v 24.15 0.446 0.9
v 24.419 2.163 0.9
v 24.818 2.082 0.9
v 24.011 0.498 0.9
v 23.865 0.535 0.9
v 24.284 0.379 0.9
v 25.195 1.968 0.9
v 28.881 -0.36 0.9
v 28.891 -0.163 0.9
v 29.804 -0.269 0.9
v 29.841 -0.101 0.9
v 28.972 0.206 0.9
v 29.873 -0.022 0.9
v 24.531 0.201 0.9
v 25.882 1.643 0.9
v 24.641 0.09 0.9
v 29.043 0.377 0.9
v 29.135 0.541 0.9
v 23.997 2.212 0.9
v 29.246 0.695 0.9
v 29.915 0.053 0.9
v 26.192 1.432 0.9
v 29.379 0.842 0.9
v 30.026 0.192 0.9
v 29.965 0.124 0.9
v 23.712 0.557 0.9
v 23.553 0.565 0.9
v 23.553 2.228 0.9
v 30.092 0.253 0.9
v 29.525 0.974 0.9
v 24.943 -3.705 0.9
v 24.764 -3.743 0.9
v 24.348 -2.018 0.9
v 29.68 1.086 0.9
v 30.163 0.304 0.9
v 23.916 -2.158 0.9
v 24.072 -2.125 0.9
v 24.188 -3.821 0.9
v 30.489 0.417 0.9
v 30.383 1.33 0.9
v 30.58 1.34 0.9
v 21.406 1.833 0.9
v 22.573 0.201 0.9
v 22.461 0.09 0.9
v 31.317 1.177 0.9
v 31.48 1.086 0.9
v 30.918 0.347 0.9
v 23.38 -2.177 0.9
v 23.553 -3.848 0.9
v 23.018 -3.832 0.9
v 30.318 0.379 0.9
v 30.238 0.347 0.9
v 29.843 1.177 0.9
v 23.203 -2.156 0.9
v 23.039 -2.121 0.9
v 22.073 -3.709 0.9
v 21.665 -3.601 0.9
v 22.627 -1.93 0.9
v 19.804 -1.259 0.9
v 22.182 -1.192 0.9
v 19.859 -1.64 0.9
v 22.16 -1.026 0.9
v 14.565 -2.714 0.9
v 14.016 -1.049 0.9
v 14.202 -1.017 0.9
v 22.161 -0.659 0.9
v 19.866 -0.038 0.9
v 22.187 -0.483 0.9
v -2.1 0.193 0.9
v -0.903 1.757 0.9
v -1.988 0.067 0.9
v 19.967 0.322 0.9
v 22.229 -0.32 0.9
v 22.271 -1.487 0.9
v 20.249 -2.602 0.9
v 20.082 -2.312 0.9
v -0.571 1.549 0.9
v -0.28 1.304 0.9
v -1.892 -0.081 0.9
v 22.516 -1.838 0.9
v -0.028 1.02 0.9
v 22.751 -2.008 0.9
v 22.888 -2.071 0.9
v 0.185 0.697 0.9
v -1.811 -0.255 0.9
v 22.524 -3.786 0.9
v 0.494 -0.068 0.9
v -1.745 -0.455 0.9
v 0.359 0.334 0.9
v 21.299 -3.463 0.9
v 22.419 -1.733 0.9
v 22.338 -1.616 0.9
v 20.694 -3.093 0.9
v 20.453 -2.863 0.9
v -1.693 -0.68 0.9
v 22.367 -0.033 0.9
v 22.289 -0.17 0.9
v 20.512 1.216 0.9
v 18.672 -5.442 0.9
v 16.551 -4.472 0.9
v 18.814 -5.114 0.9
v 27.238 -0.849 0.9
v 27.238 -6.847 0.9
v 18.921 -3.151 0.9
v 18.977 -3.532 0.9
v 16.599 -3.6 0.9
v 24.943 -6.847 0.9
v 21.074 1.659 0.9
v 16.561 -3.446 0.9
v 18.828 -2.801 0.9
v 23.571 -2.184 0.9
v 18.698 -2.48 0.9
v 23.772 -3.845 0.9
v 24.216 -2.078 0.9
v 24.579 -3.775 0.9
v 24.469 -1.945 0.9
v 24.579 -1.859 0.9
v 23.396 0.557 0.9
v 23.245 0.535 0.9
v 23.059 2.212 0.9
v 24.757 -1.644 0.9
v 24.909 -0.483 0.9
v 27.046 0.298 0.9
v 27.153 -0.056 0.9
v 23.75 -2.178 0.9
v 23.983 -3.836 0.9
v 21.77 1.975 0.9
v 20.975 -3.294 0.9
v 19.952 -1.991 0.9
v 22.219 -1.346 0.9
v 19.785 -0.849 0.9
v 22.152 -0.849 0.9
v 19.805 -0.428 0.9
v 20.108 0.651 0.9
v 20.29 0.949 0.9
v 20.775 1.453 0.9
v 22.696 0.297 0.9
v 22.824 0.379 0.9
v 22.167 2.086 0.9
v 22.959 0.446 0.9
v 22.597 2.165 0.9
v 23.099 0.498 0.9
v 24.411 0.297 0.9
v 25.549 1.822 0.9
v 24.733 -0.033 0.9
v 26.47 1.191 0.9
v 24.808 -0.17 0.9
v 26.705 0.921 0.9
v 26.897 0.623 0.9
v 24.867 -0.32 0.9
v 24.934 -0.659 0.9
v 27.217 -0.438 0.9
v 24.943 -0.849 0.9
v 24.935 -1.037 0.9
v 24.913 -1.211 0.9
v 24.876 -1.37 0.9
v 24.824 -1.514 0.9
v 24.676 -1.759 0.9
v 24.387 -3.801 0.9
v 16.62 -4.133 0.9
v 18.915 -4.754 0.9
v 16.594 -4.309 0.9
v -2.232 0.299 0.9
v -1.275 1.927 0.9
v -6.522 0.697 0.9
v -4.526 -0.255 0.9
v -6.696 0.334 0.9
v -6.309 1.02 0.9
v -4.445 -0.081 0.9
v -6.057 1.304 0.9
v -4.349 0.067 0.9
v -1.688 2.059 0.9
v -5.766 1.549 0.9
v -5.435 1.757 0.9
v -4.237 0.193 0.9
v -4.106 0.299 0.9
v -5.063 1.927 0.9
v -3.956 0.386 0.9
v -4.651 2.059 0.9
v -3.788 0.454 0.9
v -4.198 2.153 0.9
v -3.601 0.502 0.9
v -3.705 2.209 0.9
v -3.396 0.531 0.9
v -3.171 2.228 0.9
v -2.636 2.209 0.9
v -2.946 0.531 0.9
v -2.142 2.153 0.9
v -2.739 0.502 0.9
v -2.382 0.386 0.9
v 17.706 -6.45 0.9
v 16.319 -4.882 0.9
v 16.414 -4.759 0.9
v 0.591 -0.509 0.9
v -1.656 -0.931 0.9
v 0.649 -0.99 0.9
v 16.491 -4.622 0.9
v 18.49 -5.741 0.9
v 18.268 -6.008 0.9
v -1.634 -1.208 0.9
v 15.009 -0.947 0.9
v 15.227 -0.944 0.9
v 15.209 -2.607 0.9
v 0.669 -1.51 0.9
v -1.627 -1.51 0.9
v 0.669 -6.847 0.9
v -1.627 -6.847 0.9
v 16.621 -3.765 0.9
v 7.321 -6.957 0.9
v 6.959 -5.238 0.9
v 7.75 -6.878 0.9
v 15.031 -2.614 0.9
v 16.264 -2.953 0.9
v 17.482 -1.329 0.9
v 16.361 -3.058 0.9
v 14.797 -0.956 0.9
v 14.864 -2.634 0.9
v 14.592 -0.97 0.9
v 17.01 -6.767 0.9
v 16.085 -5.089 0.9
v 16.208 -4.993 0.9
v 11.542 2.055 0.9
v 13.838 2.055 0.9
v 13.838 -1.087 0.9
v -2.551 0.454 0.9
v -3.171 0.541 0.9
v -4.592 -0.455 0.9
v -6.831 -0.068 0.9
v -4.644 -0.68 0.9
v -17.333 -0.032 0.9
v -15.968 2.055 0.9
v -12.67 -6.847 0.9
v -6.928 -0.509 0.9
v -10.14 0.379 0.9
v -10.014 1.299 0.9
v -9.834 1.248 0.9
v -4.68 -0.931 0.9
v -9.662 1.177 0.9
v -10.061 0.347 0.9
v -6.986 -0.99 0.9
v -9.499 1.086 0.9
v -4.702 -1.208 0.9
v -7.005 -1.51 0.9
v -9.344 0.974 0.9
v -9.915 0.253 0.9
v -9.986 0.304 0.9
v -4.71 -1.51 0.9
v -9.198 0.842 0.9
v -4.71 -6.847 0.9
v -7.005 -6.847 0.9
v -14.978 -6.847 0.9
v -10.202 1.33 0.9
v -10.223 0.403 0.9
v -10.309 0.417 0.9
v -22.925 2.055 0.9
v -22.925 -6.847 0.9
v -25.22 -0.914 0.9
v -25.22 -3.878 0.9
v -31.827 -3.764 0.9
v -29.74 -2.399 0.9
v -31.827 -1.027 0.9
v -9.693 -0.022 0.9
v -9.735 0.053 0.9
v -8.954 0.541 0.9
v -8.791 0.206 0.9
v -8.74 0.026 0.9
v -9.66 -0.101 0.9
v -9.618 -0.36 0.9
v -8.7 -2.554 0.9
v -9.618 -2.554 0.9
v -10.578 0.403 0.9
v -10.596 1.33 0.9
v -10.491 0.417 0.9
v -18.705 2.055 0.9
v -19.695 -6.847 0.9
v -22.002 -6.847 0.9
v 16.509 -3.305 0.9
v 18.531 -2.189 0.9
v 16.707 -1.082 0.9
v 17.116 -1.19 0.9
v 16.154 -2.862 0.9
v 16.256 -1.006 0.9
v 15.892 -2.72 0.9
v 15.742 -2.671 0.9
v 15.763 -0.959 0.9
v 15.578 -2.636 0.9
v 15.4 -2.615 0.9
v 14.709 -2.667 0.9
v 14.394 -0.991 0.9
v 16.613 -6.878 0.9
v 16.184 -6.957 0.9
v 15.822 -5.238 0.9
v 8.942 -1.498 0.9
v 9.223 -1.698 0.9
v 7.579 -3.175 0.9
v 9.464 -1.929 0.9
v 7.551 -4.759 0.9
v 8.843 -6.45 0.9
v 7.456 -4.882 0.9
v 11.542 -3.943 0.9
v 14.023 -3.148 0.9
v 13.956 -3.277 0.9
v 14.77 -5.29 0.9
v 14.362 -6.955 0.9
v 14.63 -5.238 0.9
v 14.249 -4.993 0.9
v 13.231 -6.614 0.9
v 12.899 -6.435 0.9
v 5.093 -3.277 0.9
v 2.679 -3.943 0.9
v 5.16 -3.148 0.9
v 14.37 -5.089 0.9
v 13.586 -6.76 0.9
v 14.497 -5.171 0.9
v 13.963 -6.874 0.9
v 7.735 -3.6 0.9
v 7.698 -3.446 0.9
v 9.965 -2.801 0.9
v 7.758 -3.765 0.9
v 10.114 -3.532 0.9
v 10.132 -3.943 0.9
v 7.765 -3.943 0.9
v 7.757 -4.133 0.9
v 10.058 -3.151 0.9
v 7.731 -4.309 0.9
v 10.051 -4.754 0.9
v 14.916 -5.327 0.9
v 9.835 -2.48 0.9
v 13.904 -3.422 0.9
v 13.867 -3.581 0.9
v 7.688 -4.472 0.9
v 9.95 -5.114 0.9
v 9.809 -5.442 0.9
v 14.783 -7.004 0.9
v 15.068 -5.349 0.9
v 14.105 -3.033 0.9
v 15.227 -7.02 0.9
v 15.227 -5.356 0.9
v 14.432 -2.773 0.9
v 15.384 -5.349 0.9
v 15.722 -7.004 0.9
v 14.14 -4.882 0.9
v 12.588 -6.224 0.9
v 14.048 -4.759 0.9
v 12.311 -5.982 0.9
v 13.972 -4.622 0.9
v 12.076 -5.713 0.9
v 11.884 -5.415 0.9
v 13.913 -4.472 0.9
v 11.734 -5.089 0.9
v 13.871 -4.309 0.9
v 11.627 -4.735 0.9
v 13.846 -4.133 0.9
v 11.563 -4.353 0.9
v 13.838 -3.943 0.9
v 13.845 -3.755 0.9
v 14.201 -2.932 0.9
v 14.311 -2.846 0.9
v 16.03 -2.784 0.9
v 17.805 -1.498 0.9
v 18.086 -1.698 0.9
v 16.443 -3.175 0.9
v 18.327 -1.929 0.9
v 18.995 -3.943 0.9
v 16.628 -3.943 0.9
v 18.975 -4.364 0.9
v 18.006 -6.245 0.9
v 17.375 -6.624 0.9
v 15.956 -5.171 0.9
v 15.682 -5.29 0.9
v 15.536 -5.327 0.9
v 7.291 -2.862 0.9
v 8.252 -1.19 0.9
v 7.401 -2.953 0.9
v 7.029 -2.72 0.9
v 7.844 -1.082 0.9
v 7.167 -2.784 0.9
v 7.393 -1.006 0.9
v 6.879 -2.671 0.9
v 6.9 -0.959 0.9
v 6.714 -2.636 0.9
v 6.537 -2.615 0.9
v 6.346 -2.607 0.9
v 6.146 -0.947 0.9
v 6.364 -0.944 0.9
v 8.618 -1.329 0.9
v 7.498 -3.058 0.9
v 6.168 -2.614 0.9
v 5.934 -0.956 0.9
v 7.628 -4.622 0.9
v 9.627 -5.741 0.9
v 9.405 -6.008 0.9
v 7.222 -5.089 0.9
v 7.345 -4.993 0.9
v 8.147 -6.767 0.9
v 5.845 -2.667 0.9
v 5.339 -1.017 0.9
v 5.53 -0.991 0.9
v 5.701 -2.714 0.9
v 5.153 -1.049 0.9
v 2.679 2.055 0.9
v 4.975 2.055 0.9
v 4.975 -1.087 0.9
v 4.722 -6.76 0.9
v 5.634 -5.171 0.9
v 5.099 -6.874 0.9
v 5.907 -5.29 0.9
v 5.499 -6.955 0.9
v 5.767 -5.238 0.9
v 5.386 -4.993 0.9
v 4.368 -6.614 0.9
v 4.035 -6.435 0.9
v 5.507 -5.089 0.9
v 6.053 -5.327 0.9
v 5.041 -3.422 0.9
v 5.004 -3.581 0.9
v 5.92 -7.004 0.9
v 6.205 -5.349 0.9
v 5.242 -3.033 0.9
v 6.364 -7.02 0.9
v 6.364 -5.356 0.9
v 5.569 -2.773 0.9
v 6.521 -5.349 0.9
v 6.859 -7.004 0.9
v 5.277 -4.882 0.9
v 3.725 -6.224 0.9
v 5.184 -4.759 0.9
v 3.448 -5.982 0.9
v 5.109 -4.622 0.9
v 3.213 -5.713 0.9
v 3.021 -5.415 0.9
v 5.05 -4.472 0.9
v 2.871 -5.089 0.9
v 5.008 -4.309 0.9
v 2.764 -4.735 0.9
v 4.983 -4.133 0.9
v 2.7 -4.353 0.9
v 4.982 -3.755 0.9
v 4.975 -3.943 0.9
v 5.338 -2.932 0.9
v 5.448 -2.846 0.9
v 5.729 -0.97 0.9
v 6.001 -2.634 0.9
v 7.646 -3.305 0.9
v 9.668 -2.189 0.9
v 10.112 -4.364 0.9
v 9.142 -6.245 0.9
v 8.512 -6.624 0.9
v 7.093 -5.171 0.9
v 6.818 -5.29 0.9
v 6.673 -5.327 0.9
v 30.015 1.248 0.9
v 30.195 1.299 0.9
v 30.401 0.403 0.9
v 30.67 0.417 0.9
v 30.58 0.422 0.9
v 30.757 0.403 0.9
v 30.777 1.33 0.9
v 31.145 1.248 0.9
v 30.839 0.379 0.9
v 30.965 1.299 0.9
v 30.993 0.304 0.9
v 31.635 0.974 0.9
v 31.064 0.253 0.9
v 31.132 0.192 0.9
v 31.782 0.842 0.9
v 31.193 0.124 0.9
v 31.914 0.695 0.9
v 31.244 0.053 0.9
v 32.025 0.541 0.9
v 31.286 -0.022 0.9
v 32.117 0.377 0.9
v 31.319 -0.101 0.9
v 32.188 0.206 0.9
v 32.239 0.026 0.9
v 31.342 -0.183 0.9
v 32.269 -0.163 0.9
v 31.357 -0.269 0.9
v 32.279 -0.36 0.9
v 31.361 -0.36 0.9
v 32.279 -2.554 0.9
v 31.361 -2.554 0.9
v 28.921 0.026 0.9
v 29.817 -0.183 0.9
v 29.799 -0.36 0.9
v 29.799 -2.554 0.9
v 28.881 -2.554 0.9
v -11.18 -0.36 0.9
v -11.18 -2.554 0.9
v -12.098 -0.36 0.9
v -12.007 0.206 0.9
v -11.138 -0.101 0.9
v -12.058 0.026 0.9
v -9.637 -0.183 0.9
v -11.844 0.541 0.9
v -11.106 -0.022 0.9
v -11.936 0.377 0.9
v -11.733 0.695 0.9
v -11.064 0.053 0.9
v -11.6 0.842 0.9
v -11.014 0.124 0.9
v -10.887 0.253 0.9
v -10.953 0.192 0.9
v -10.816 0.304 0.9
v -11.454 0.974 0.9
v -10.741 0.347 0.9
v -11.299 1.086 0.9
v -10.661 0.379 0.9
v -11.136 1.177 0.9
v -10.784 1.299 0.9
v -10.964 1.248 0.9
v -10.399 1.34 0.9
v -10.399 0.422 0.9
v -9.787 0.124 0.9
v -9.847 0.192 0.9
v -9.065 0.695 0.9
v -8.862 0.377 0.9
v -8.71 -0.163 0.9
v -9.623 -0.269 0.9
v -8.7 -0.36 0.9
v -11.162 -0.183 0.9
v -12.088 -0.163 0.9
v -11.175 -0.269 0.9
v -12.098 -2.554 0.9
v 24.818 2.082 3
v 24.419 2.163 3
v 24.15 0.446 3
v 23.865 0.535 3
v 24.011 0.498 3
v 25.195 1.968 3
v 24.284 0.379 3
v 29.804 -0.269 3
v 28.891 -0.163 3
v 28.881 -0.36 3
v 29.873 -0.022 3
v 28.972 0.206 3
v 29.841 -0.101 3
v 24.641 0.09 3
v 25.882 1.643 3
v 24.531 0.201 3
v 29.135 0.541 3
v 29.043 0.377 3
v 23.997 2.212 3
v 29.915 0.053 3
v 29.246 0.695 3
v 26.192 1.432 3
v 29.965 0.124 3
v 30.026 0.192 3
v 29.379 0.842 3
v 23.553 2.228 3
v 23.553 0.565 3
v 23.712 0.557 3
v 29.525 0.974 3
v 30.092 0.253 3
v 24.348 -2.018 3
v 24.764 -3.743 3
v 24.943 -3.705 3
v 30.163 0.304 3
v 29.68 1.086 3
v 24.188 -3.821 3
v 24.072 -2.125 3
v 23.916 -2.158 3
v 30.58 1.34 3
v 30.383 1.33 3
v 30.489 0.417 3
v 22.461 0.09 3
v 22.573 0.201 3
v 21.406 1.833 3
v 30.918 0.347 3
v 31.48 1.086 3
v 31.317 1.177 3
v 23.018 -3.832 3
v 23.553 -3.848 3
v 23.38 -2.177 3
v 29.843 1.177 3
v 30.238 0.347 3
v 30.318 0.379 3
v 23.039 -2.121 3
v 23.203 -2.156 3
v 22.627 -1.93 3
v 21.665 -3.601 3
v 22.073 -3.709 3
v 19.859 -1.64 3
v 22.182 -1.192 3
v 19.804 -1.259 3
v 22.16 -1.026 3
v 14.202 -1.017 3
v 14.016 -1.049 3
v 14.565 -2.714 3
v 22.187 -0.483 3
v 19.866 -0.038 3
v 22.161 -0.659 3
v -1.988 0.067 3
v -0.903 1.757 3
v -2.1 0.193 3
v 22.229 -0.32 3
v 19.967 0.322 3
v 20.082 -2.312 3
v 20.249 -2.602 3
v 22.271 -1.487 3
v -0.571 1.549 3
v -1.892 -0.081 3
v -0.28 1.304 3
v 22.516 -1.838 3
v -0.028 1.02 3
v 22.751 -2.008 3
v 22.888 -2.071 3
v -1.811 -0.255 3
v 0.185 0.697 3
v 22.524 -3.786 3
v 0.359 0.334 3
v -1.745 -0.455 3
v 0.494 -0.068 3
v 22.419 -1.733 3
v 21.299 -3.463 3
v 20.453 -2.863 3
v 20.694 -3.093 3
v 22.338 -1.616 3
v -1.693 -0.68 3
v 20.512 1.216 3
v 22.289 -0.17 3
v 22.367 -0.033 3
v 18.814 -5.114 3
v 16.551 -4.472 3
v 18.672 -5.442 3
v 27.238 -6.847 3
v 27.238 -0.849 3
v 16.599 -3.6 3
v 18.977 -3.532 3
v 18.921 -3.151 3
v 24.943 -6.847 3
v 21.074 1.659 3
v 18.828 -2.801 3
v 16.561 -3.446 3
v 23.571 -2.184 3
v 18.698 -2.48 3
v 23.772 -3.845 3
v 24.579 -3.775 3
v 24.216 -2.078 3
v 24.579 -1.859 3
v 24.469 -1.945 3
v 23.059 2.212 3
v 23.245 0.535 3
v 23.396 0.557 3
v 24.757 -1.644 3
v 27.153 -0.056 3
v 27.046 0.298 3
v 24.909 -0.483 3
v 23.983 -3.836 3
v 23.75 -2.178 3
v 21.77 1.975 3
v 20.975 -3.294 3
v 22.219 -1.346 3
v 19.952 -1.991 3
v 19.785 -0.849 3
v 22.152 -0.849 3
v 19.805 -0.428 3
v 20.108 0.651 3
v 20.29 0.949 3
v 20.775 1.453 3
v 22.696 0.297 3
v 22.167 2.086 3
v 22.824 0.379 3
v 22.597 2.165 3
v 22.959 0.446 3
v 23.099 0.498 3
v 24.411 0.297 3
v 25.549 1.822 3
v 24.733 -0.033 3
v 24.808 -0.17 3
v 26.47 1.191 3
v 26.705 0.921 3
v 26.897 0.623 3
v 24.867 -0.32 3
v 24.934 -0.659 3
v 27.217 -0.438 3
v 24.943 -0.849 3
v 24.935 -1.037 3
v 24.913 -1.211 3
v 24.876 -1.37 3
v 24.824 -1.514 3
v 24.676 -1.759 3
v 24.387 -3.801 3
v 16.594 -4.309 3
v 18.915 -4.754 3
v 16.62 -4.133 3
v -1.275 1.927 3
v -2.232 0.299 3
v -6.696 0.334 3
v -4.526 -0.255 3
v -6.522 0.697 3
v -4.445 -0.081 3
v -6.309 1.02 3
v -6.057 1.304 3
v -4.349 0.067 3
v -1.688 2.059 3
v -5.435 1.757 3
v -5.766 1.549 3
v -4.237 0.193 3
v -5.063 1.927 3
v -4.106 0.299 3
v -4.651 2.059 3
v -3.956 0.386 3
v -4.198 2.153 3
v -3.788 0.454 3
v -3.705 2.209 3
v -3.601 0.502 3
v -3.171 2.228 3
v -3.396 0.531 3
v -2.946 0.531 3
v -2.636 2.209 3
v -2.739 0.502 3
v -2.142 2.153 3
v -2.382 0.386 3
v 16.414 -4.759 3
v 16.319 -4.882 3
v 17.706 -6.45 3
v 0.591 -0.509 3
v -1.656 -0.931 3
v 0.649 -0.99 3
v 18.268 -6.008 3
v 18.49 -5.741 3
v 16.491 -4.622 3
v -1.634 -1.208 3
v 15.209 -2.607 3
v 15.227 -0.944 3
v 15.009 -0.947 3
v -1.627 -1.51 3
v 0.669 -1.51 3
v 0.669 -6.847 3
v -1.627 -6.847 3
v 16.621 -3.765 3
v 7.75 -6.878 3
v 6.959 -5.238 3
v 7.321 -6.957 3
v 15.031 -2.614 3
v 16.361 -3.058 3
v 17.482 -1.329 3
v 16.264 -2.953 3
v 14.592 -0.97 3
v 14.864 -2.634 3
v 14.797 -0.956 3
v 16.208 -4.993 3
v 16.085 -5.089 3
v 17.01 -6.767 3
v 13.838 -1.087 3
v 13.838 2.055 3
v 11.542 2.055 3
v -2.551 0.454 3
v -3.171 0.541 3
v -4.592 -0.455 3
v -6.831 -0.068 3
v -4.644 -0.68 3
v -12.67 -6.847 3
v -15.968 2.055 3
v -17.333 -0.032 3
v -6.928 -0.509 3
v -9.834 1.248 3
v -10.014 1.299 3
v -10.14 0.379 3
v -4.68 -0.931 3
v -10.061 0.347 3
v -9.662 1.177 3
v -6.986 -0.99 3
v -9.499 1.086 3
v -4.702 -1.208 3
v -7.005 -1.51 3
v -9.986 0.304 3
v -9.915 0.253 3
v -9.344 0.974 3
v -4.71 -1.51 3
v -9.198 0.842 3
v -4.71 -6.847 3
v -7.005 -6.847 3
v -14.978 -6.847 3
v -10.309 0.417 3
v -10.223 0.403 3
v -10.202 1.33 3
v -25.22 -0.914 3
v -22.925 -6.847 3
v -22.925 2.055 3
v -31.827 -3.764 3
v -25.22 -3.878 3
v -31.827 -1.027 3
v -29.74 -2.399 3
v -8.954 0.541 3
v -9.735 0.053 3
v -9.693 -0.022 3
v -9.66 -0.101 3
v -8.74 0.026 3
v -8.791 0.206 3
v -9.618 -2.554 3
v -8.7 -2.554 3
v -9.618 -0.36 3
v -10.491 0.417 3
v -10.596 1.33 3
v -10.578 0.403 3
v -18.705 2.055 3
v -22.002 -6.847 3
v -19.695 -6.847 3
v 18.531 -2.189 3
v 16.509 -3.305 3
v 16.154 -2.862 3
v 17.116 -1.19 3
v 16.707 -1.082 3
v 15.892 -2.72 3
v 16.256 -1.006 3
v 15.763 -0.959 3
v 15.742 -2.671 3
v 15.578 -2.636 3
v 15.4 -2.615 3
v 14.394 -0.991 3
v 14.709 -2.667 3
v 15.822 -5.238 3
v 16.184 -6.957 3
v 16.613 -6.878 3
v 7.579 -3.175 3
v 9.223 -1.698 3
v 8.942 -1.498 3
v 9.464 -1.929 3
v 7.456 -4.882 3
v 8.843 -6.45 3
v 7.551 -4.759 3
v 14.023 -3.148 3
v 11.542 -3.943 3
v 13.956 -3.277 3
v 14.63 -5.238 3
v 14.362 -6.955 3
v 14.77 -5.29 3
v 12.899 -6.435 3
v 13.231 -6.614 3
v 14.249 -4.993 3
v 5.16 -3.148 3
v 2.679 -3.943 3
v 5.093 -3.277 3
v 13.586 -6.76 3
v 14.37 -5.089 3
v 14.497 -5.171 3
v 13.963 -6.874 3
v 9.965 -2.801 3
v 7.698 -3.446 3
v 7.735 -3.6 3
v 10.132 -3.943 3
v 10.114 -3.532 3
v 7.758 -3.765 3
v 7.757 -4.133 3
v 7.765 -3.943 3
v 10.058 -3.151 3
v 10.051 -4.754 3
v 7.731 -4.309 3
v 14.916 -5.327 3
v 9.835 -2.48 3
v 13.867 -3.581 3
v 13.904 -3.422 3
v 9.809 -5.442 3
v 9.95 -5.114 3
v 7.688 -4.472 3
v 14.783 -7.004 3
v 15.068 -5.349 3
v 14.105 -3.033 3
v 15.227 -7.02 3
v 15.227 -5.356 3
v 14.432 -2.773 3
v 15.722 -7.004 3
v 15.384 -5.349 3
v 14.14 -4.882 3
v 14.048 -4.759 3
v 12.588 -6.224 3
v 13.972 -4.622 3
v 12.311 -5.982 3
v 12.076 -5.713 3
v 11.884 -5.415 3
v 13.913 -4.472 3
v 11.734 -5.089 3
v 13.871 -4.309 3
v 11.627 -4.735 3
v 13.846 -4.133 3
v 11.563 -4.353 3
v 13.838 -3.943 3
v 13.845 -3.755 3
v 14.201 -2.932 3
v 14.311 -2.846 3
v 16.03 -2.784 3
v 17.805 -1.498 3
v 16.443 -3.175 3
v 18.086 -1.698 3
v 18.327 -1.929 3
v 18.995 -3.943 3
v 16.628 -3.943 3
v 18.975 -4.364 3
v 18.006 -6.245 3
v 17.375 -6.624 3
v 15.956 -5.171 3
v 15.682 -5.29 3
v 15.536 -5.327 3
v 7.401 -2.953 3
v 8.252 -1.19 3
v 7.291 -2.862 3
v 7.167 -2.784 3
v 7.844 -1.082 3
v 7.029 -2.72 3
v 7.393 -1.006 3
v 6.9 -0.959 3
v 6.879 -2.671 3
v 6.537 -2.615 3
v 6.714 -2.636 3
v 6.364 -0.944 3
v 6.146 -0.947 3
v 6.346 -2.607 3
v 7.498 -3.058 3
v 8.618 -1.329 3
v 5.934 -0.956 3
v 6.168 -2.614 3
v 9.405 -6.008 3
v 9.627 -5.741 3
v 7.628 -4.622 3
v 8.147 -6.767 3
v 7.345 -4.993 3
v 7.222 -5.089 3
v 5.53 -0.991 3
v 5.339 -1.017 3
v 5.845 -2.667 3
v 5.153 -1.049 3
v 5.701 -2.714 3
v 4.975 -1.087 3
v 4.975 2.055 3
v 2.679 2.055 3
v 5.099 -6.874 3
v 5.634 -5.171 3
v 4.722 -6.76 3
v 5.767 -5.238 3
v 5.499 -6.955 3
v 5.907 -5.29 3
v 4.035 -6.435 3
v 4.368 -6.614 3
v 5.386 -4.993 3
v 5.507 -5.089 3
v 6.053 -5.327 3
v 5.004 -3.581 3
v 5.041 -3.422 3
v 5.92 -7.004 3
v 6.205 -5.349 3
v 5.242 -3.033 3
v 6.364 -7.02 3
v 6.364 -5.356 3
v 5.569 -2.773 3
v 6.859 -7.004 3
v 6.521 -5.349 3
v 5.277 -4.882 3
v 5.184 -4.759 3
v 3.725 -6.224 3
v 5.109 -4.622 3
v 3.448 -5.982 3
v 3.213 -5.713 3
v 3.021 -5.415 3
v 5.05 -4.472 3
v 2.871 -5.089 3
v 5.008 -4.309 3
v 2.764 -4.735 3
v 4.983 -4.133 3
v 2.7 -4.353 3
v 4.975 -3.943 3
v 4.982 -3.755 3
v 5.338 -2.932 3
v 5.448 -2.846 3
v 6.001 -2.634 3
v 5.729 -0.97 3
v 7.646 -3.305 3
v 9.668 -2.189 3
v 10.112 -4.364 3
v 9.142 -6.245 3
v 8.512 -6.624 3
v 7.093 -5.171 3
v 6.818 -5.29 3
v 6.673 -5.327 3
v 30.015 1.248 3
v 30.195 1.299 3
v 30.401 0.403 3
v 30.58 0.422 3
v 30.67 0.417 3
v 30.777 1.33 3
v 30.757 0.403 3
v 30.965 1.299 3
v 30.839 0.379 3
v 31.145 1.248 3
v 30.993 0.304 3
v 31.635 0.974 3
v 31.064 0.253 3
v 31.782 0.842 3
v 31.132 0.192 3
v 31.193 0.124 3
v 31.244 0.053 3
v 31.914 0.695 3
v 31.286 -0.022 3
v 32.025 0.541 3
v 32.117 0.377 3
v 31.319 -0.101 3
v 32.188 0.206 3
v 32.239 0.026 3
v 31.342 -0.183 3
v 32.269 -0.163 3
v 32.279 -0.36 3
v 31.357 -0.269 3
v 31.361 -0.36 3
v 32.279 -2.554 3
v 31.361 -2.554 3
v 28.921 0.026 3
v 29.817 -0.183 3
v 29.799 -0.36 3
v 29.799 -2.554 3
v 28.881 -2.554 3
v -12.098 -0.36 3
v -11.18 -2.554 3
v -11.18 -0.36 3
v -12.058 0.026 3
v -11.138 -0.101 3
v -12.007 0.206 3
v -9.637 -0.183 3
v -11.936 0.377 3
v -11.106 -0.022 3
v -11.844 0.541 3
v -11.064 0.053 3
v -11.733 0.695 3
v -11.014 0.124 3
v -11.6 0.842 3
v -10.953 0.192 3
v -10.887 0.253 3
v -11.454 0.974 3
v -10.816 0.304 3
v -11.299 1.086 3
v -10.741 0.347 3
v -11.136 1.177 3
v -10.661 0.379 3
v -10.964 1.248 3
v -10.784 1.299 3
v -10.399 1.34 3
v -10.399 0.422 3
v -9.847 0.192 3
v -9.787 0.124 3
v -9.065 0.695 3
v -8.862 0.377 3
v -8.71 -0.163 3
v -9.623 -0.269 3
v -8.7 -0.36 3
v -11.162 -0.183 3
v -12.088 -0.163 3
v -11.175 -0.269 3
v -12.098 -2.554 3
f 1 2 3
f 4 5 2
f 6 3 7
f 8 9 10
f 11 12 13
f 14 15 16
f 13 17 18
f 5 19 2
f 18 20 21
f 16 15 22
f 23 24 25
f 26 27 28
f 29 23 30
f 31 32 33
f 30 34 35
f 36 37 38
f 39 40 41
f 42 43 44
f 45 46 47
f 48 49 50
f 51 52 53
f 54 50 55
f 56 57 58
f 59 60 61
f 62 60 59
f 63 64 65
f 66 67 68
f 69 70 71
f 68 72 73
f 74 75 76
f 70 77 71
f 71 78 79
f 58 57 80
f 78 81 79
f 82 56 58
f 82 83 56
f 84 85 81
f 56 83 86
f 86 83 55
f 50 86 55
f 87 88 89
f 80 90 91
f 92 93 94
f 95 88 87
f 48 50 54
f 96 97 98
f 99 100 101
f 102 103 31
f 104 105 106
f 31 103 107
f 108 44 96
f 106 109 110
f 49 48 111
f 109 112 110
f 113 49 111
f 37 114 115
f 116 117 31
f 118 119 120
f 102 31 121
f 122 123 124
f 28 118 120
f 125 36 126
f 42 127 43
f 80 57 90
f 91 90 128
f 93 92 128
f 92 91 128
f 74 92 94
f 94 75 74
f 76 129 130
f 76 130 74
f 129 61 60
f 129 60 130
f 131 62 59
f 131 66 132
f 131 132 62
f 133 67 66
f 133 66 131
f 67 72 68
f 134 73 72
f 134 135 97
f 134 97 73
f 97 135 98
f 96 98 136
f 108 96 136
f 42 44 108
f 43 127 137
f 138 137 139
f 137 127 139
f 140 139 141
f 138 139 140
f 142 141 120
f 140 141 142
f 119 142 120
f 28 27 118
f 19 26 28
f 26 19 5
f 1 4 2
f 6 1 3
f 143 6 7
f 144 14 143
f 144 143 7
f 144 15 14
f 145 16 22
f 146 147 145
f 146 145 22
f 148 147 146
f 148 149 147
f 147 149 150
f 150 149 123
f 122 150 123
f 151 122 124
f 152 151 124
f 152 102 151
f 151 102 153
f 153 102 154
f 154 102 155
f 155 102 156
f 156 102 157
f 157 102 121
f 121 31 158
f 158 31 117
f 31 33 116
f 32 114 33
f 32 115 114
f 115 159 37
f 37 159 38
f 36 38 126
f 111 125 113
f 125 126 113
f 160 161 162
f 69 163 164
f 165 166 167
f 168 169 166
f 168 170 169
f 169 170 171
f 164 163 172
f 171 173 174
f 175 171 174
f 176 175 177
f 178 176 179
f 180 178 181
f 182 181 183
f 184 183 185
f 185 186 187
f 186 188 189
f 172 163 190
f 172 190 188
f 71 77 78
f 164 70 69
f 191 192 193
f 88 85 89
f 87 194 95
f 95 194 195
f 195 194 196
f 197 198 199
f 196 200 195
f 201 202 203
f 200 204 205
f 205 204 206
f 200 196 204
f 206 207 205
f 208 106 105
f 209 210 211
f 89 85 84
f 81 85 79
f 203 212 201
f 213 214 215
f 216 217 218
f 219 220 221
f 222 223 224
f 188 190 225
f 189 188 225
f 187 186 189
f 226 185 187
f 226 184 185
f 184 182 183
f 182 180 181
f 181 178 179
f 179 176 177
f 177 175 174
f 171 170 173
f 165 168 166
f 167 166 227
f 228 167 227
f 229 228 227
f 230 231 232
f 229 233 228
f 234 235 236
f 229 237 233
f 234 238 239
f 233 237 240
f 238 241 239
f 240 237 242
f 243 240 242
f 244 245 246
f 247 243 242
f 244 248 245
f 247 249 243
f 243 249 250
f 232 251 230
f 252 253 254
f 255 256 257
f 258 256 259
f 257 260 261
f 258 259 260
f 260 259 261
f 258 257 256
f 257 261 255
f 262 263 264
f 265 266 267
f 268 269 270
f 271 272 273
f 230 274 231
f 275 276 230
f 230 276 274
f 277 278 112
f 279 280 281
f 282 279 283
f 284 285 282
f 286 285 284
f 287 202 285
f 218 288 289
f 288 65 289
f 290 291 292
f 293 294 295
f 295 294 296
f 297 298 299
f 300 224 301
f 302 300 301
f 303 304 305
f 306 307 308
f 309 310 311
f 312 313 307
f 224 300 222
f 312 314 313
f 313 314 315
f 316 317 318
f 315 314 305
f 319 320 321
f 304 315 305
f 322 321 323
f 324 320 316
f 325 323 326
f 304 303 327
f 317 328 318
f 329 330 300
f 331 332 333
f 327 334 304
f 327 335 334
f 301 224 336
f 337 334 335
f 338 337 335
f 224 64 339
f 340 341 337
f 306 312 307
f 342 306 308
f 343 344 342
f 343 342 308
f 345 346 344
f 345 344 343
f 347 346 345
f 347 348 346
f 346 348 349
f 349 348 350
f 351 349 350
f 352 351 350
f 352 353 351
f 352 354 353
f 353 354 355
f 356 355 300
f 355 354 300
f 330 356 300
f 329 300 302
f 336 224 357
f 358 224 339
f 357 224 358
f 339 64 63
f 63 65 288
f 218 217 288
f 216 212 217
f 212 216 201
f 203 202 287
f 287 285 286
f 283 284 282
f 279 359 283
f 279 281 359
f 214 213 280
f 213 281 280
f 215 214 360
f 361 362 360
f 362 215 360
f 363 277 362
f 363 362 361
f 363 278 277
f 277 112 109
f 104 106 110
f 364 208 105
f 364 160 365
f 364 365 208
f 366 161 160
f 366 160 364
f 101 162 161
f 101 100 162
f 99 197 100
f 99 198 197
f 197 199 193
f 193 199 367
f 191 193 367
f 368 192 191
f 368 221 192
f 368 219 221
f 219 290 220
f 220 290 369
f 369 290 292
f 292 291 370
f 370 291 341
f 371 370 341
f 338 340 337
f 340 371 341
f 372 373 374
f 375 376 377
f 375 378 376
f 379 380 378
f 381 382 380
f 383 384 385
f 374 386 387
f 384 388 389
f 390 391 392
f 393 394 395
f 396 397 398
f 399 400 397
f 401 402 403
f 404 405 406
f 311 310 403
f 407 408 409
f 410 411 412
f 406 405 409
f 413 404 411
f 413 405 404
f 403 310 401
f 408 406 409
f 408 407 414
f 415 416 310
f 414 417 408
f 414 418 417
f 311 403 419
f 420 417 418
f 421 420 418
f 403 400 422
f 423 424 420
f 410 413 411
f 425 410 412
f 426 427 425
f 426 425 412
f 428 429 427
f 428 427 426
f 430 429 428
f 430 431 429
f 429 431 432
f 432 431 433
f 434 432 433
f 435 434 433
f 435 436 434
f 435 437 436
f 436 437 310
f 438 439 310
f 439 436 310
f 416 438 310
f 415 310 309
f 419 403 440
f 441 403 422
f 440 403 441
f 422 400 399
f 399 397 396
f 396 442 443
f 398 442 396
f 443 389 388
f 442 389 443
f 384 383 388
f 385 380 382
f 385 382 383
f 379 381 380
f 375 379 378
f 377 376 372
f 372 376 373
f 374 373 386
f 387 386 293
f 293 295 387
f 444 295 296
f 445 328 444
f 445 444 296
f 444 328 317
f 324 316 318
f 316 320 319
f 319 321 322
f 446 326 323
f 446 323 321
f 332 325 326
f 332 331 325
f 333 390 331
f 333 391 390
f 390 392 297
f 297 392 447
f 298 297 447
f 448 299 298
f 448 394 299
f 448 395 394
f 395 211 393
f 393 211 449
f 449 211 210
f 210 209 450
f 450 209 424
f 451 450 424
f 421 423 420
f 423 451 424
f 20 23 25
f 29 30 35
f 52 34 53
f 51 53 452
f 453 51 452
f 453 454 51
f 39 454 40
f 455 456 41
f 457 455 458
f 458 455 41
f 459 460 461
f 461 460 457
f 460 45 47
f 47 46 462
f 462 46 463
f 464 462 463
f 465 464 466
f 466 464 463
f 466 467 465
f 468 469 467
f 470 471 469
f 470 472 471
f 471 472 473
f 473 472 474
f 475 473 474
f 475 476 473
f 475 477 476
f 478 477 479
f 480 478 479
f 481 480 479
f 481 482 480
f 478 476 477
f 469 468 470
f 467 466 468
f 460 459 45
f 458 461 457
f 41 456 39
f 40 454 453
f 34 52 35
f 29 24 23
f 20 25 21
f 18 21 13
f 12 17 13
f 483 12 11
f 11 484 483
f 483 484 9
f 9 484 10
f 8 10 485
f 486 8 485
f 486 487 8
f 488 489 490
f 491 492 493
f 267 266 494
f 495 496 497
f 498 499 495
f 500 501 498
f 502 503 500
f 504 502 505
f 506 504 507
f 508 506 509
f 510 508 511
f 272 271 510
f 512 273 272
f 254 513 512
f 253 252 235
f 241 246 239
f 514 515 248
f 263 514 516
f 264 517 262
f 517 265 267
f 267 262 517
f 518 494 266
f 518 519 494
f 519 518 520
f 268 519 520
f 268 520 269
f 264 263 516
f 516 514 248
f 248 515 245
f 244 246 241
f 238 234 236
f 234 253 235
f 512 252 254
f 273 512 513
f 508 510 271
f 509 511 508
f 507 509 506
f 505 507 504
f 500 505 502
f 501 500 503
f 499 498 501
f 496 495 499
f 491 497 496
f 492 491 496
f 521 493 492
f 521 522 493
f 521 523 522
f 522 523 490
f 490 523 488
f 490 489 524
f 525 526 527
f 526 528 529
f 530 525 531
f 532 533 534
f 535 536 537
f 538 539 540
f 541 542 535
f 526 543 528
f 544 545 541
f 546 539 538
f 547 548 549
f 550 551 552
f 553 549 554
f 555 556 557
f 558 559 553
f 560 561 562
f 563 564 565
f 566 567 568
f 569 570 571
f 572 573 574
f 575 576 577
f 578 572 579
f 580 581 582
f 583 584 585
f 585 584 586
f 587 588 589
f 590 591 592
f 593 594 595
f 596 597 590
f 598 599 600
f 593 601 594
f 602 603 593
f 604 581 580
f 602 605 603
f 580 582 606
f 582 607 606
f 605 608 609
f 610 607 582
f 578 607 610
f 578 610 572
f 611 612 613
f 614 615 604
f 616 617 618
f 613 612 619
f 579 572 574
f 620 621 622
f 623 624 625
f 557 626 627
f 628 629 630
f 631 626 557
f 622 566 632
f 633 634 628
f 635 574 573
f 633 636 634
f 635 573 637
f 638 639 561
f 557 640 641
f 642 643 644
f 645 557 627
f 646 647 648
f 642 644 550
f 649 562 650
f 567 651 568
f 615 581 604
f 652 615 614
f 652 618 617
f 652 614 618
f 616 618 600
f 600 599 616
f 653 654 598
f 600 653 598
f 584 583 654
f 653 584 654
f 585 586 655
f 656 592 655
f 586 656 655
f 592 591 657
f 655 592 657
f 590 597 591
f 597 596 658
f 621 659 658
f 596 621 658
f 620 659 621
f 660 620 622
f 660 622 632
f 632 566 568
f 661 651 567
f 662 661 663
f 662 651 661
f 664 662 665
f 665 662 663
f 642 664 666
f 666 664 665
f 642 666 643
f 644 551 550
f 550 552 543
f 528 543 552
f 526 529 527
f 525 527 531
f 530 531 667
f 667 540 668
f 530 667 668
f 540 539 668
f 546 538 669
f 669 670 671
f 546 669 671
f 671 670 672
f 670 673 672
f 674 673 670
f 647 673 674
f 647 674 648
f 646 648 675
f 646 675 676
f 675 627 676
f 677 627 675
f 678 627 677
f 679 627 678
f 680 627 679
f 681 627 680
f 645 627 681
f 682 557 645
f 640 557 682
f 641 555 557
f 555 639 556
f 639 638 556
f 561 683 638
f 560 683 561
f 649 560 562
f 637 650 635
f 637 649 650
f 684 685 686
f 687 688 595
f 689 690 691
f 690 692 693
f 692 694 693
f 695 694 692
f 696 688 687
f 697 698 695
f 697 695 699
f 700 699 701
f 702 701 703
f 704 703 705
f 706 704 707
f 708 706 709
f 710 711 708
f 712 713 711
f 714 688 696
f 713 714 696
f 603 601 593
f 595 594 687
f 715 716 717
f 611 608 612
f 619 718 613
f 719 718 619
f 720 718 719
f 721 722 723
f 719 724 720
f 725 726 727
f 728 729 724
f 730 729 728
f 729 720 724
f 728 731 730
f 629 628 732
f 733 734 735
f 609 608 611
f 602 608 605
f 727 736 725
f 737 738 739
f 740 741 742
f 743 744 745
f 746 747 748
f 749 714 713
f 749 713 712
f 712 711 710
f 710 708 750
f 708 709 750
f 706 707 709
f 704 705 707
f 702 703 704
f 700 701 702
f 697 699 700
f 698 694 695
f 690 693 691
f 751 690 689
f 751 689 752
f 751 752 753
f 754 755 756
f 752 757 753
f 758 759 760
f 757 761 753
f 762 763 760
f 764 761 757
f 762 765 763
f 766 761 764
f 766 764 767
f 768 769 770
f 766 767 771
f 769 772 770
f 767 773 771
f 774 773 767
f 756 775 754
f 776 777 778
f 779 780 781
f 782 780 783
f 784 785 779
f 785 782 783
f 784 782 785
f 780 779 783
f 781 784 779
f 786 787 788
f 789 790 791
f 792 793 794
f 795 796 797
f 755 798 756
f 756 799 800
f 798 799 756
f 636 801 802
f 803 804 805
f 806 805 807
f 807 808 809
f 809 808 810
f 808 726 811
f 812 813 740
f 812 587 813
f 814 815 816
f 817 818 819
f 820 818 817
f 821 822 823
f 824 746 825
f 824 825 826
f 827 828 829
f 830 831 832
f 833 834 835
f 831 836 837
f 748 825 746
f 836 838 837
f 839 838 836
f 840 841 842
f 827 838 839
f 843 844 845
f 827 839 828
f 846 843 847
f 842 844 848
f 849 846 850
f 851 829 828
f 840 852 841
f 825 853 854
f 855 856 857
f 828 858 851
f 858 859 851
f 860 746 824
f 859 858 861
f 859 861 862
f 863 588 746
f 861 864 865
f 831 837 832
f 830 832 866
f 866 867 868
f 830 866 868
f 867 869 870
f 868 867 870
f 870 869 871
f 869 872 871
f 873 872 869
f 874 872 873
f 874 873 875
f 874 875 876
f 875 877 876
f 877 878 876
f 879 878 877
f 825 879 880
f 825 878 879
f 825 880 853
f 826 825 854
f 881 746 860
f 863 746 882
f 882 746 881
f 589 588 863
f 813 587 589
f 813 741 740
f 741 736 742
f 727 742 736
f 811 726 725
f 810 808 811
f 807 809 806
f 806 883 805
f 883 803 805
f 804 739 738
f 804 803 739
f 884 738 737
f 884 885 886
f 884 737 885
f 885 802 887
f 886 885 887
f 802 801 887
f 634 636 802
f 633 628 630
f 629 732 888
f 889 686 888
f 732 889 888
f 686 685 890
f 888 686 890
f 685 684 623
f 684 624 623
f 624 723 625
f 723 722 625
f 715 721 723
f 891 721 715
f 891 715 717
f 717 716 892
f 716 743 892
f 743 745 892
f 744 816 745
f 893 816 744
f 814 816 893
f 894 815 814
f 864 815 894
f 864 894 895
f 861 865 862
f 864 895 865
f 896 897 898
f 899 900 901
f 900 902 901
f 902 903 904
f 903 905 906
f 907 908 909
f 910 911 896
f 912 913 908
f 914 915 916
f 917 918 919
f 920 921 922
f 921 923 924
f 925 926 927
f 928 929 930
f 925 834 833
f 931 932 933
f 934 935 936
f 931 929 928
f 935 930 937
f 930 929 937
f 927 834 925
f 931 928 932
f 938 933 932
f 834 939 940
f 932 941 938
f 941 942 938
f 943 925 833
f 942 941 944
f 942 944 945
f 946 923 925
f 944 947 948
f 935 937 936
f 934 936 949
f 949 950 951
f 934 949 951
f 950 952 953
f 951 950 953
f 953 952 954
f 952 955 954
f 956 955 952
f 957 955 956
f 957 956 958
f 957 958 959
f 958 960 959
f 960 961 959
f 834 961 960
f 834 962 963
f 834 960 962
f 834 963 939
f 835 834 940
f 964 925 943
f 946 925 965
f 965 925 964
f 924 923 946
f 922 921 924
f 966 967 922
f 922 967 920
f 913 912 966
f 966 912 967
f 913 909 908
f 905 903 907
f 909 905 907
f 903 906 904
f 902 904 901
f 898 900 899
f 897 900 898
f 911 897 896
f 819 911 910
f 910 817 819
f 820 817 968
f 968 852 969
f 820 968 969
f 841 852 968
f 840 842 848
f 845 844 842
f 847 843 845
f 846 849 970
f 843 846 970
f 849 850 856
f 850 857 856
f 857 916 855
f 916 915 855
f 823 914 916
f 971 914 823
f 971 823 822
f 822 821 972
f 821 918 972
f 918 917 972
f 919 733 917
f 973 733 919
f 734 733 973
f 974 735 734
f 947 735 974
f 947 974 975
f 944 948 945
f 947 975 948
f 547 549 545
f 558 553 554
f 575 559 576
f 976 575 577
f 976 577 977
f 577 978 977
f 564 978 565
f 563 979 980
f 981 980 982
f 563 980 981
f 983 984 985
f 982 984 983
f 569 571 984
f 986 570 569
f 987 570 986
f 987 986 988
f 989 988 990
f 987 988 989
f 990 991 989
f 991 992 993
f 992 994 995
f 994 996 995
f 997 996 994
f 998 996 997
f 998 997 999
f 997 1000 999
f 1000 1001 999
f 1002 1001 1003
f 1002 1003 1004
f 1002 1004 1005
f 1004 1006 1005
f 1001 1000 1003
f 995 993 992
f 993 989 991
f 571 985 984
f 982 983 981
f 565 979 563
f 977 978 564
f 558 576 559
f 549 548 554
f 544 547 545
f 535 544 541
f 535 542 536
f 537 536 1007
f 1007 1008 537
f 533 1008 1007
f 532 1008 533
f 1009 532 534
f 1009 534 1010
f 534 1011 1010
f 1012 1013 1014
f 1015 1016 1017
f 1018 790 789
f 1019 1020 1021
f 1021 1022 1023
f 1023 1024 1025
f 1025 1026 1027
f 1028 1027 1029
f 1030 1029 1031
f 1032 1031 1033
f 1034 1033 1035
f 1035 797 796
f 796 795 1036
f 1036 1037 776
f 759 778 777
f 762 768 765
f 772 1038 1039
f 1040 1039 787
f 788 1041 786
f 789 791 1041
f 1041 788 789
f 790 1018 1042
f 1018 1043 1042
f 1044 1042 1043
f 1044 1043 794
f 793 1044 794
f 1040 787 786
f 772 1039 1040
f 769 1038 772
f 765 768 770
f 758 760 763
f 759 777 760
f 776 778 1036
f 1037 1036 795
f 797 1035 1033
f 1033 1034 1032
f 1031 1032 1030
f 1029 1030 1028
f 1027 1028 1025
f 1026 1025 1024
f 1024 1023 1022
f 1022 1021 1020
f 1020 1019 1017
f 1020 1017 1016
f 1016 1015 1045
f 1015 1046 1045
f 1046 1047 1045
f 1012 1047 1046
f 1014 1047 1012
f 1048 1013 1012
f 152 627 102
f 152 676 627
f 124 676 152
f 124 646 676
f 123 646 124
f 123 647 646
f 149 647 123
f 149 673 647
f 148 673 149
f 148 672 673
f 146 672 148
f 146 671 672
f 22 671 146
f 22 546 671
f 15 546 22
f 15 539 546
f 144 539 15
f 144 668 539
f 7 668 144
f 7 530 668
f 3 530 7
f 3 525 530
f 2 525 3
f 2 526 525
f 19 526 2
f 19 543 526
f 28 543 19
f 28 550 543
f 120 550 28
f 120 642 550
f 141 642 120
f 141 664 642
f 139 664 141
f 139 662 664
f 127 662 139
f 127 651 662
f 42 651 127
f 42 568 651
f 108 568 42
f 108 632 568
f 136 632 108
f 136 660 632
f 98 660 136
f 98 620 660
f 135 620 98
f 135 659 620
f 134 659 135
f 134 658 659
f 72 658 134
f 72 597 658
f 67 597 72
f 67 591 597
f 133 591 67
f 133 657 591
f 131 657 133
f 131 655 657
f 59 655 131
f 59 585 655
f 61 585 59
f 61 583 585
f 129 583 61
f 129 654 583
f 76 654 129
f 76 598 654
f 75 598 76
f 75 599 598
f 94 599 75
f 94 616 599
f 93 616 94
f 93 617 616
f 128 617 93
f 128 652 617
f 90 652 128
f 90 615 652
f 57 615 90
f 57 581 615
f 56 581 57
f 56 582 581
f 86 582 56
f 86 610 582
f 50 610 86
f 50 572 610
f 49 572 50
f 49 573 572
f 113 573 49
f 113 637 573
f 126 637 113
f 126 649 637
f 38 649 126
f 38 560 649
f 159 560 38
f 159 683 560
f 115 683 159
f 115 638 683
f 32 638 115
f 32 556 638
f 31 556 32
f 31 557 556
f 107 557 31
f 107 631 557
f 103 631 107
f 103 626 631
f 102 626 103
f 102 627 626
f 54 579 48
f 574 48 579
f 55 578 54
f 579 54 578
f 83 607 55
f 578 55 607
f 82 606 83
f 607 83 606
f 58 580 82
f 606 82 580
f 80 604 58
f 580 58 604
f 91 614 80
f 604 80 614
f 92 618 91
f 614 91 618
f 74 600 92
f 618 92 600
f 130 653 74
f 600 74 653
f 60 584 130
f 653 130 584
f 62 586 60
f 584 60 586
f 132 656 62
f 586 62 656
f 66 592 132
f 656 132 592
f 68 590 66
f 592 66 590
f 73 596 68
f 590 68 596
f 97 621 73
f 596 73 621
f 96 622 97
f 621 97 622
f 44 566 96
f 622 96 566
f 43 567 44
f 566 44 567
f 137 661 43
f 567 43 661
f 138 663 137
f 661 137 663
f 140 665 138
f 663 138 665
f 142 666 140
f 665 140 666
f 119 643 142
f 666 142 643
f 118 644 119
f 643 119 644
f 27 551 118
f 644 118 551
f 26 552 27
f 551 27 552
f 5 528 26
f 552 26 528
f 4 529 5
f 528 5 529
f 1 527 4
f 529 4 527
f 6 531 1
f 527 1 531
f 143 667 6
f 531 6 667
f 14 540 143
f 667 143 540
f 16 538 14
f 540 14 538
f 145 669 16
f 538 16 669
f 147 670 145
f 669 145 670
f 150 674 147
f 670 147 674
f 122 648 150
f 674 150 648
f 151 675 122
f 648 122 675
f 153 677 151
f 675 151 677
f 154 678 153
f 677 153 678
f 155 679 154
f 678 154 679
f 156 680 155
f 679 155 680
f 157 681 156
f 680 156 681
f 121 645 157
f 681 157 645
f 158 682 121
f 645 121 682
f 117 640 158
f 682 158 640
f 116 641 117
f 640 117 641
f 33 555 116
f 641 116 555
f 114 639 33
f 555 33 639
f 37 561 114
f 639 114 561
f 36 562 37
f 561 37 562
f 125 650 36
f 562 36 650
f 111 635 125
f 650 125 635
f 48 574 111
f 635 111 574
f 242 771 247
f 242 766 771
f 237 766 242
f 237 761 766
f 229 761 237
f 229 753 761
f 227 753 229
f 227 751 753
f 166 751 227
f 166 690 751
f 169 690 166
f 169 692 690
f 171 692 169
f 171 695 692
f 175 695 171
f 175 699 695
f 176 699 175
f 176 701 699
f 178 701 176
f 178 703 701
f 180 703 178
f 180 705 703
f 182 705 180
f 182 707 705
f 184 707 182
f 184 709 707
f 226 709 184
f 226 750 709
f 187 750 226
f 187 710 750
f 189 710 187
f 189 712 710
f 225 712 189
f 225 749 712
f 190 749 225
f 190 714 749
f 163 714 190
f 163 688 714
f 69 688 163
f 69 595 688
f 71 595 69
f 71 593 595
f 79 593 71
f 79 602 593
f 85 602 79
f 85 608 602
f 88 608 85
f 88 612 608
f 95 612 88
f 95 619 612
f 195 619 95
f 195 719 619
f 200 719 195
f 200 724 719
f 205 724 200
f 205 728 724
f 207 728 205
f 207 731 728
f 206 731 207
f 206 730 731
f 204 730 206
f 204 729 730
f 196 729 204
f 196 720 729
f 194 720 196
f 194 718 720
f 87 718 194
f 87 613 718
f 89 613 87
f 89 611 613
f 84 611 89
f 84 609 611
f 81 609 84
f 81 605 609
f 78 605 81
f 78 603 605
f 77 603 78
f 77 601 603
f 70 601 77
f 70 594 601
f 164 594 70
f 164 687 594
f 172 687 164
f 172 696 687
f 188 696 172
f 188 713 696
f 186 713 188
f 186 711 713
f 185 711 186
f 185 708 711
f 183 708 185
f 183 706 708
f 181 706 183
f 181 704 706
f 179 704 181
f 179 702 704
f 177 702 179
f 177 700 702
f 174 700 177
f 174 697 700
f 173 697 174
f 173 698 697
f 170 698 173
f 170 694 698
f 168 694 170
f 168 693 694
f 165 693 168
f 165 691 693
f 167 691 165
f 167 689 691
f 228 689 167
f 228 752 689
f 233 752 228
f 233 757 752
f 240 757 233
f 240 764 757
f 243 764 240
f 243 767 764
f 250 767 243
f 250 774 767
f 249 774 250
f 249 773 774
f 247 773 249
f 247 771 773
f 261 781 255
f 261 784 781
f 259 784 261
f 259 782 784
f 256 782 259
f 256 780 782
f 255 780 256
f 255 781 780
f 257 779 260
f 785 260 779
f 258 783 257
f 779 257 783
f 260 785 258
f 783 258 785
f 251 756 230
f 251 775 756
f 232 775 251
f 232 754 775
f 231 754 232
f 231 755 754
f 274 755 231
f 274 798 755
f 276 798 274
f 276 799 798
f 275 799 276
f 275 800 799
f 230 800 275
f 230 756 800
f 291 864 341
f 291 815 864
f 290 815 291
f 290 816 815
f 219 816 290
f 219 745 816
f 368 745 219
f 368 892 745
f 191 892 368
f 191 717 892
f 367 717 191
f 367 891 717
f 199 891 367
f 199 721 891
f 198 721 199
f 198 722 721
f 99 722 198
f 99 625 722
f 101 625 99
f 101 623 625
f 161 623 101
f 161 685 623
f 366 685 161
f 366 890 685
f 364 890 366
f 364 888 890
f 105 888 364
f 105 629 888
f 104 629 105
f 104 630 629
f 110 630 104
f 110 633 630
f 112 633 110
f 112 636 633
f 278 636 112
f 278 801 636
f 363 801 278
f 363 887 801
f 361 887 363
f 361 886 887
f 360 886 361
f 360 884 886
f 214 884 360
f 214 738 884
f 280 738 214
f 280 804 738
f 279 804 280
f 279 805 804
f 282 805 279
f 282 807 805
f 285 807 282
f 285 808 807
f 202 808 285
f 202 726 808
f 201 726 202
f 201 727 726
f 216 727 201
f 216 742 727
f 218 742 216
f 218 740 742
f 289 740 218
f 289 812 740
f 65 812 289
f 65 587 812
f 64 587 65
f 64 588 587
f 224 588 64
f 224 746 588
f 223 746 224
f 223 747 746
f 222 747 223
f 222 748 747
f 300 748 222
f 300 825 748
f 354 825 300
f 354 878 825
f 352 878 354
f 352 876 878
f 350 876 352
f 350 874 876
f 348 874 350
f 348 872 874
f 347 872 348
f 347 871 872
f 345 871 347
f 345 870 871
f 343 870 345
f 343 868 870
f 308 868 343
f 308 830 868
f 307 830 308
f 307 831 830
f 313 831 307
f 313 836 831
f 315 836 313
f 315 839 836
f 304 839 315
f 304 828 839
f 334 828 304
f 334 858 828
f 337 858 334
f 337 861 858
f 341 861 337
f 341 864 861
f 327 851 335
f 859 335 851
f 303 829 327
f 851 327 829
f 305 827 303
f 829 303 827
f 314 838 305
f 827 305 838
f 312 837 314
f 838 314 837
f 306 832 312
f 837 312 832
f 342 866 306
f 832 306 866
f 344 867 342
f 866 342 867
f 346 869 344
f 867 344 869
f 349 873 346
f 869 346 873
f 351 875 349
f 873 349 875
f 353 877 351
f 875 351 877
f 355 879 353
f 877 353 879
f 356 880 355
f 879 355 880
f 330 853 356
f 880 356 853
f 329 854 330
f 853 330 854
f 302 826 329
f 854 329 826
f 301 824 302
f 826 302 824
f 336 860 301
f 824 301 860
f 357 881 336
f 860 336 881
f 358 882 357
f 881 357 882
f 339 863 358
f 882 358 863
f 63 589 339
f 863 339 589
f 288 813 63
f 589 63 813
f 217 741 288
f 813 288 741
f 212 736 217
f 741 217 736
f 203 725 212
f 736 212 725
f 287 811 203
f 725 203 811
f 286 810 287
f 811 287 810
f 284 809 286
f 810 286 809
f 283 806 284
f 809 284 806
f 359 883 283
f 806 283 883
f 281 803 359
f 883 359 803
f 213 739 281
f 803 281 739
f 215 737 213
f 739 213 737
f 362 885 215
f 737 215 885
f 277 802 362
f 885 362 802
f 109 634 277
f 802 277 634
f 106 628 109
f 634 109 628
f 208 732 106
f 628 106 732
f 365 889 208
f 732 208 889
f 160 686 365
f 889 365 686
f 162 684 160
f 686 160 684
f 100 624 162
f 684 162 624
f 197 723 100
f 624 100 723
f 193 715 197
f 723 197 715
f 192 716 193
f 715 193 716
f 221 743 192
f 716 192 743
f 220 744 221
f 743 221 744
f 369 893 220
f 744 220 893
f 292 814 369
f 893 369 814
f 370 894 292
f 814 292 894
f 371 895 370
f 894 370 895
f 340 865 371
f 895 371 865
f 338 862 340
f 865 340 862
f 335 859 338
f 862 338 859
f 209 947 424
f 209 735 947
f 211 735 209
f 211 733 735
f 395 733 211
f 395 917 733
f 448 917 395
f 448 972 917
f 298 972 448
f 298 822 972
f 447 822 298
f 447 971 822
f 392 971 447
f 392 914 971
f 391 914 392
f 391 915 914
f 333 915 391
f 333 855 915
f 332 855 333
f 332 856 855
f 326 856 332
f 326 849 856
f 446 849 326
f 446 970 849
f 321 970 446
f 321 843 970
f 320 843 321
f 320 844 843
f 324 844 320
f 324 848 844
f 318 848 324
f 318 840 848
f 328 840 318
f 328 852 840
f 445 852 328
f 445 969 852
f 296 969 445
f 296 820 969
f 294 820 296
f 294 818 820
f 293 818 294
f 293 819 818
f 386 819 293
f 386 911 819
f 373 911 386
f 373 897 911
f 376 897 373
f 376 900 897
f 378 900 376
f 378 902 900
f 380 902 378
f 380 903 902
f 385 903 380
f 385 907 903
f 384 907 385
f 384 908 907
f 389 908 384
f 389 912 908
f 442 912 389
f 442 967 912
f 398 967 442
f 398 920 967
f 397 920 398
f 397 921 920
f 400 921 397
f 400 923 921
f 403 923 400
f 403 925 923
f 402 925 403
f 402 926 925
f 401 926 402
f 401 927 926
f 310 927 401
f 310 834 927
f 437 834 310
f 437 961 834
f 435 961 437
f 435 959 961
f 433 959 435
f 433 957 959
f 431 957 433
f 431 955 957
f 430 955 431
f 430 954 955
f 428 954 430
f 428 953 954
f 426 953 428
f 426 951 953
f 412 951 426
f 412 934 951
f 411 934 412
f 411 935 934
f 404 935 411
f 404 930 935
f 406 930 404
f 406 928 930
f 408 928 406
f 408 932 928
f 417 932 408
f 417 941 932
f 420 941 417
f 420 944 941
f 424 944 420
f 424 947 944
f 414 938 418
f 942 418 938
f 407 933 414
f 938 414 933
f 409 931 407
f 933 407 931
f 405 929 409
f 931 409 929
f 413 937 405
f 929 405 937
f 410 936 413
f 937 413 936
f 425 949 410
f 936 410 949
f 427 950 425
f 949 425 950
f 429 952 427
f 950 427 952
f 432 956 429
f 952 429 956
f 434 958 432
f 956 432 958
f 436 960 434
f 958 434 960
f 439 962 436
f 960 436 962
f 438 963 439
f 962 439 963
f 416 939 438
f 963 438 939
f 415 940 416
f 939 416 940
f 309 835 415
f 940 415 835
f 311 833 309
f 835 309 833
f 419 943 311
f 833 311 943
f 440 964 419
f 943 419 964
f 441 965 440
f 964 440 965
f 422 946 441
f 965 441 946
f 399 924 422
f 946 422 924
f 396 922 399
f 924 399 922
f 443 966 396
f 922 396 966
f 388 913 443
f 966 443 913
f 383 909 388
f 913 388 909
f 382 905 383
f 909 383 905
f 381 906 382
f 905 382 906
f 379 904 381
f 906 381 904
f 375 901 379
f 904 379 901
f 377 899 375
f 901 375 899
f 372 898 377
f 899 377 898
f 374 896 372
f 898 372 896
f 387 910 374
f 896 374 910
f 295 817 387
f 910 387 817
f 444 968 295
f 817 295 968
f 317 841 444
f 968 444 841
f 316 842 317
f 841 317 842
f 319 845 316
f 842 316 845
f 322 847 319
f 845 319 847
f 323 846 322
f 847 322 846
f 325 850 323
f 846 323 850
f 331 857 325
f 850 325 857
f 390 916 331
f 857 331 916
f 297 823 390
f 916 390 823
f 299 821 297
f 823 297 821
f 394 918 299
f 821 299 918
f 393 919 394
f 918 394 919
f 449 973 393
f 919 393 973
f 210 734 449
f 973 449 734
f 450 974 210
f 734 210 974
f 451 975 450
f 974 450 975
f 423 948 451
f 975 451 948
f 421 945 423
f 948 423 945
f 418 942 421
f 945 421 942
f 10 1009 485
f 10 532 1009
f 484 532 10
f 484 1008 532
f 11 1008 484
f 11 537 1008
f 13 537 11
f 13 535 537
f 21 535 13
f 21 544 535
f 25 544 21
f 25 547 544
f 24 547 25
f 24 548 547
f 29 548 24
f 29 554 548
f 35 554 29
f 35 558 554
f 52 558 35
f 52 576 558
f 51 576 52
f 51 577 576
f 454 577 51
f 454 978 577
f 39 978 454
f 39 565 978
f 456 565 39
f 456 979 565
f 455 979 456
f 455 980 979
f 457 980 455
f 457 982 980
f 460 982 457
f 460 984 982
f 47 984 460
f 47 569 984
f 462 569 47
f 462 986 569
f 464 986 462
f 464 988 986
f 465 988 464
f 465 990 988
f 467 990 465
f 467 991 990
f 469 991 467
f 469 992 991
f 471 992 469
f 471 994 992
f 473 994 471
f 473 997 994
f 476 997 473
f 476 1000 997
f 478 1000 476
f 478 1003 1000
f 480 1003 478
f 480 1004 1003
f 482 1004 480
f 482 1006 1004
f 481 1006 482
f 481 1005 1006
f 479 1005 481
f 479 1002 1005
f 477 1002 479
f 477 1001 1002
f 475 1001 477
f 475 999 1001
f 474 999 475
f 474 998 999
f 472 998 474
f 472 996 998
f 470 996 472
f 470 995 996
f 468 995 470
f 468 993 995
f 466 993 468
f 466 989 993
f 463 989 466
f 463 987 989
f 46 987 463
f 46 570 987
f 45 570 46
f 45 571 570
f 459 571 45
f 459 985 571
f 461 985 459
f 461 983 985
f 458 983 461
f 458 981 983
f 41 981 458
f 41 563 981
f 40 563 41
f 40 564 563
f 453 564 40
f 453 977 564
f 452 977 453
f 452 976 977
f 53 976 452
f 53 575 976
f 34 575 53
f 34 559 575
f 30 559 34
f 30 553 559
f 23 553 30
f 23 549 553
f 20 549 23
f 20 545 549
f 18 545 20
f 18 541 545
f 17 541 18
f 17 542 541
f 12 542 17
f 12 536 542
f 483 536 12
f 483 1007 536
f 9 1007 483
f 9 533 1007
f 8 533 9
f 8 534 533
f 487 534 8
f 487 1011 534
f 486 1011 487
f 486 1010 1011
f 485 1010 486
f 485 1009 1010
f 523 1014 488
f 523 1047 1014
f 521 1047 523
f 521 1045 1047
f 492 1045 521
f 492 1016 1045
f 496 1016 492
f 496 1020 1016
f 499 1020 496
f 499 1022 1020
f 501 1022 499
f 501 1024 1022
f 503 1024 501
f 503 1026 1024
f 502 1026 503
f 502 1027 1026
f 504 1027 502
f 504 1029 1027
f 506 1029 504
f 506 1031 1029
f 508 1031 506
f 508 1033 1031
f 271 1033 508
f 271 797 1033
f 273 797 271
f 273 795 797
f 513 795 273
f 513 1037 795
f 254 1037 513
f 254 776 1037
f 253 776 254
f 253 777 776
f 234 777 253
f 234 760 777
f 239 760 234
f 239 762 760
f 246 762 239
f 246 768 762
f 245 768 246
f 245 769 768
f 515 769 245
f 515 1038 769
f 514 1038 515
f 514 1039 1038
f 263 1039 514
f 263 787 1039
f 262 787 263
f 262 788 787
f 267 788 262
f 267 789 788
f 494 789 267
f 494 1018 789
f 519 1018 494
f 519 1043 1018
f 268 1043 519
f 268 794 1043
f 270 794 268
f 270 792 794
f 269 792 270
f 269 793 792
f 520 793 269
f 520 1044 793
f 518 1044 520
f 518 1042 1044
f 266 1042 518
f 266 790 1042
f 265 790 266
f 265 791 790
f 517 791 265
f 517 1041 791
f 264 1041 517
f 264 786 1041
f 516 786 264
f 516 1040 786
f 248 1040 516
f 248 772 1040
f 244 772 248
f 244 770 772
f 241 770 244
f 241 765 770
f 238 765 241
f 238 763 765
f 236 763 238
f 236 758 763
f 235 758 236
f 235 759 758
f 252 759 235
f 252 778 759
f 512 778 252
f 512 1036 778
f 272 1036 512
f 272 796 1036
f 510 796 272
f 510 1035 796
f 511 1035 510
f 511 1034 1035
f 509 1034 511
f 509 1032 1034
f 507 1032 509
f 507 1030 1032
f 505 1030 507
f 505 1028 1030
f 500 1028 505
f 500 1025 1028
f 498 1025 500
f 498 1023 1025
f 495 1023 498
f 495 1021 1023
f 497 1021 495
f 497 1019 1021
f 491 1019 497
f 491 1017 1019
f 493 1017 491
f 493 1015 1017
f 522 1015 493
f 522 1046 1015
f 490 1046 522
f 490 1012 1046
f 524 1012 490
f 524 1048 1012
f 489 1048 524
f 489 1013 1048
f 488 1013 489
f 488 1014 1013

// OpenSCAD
$fn = 48;
  // syllabics (overlaid on icon, tallest)
  translate([0, -2.500, 0.900]) linear_extrude(height=2.100) text("ᐊᐱᐢᑎᑲᑲᑫᐢ", size=8.793, halign="center", valign="center", font="Euphemia UCAS:style=Bold");
